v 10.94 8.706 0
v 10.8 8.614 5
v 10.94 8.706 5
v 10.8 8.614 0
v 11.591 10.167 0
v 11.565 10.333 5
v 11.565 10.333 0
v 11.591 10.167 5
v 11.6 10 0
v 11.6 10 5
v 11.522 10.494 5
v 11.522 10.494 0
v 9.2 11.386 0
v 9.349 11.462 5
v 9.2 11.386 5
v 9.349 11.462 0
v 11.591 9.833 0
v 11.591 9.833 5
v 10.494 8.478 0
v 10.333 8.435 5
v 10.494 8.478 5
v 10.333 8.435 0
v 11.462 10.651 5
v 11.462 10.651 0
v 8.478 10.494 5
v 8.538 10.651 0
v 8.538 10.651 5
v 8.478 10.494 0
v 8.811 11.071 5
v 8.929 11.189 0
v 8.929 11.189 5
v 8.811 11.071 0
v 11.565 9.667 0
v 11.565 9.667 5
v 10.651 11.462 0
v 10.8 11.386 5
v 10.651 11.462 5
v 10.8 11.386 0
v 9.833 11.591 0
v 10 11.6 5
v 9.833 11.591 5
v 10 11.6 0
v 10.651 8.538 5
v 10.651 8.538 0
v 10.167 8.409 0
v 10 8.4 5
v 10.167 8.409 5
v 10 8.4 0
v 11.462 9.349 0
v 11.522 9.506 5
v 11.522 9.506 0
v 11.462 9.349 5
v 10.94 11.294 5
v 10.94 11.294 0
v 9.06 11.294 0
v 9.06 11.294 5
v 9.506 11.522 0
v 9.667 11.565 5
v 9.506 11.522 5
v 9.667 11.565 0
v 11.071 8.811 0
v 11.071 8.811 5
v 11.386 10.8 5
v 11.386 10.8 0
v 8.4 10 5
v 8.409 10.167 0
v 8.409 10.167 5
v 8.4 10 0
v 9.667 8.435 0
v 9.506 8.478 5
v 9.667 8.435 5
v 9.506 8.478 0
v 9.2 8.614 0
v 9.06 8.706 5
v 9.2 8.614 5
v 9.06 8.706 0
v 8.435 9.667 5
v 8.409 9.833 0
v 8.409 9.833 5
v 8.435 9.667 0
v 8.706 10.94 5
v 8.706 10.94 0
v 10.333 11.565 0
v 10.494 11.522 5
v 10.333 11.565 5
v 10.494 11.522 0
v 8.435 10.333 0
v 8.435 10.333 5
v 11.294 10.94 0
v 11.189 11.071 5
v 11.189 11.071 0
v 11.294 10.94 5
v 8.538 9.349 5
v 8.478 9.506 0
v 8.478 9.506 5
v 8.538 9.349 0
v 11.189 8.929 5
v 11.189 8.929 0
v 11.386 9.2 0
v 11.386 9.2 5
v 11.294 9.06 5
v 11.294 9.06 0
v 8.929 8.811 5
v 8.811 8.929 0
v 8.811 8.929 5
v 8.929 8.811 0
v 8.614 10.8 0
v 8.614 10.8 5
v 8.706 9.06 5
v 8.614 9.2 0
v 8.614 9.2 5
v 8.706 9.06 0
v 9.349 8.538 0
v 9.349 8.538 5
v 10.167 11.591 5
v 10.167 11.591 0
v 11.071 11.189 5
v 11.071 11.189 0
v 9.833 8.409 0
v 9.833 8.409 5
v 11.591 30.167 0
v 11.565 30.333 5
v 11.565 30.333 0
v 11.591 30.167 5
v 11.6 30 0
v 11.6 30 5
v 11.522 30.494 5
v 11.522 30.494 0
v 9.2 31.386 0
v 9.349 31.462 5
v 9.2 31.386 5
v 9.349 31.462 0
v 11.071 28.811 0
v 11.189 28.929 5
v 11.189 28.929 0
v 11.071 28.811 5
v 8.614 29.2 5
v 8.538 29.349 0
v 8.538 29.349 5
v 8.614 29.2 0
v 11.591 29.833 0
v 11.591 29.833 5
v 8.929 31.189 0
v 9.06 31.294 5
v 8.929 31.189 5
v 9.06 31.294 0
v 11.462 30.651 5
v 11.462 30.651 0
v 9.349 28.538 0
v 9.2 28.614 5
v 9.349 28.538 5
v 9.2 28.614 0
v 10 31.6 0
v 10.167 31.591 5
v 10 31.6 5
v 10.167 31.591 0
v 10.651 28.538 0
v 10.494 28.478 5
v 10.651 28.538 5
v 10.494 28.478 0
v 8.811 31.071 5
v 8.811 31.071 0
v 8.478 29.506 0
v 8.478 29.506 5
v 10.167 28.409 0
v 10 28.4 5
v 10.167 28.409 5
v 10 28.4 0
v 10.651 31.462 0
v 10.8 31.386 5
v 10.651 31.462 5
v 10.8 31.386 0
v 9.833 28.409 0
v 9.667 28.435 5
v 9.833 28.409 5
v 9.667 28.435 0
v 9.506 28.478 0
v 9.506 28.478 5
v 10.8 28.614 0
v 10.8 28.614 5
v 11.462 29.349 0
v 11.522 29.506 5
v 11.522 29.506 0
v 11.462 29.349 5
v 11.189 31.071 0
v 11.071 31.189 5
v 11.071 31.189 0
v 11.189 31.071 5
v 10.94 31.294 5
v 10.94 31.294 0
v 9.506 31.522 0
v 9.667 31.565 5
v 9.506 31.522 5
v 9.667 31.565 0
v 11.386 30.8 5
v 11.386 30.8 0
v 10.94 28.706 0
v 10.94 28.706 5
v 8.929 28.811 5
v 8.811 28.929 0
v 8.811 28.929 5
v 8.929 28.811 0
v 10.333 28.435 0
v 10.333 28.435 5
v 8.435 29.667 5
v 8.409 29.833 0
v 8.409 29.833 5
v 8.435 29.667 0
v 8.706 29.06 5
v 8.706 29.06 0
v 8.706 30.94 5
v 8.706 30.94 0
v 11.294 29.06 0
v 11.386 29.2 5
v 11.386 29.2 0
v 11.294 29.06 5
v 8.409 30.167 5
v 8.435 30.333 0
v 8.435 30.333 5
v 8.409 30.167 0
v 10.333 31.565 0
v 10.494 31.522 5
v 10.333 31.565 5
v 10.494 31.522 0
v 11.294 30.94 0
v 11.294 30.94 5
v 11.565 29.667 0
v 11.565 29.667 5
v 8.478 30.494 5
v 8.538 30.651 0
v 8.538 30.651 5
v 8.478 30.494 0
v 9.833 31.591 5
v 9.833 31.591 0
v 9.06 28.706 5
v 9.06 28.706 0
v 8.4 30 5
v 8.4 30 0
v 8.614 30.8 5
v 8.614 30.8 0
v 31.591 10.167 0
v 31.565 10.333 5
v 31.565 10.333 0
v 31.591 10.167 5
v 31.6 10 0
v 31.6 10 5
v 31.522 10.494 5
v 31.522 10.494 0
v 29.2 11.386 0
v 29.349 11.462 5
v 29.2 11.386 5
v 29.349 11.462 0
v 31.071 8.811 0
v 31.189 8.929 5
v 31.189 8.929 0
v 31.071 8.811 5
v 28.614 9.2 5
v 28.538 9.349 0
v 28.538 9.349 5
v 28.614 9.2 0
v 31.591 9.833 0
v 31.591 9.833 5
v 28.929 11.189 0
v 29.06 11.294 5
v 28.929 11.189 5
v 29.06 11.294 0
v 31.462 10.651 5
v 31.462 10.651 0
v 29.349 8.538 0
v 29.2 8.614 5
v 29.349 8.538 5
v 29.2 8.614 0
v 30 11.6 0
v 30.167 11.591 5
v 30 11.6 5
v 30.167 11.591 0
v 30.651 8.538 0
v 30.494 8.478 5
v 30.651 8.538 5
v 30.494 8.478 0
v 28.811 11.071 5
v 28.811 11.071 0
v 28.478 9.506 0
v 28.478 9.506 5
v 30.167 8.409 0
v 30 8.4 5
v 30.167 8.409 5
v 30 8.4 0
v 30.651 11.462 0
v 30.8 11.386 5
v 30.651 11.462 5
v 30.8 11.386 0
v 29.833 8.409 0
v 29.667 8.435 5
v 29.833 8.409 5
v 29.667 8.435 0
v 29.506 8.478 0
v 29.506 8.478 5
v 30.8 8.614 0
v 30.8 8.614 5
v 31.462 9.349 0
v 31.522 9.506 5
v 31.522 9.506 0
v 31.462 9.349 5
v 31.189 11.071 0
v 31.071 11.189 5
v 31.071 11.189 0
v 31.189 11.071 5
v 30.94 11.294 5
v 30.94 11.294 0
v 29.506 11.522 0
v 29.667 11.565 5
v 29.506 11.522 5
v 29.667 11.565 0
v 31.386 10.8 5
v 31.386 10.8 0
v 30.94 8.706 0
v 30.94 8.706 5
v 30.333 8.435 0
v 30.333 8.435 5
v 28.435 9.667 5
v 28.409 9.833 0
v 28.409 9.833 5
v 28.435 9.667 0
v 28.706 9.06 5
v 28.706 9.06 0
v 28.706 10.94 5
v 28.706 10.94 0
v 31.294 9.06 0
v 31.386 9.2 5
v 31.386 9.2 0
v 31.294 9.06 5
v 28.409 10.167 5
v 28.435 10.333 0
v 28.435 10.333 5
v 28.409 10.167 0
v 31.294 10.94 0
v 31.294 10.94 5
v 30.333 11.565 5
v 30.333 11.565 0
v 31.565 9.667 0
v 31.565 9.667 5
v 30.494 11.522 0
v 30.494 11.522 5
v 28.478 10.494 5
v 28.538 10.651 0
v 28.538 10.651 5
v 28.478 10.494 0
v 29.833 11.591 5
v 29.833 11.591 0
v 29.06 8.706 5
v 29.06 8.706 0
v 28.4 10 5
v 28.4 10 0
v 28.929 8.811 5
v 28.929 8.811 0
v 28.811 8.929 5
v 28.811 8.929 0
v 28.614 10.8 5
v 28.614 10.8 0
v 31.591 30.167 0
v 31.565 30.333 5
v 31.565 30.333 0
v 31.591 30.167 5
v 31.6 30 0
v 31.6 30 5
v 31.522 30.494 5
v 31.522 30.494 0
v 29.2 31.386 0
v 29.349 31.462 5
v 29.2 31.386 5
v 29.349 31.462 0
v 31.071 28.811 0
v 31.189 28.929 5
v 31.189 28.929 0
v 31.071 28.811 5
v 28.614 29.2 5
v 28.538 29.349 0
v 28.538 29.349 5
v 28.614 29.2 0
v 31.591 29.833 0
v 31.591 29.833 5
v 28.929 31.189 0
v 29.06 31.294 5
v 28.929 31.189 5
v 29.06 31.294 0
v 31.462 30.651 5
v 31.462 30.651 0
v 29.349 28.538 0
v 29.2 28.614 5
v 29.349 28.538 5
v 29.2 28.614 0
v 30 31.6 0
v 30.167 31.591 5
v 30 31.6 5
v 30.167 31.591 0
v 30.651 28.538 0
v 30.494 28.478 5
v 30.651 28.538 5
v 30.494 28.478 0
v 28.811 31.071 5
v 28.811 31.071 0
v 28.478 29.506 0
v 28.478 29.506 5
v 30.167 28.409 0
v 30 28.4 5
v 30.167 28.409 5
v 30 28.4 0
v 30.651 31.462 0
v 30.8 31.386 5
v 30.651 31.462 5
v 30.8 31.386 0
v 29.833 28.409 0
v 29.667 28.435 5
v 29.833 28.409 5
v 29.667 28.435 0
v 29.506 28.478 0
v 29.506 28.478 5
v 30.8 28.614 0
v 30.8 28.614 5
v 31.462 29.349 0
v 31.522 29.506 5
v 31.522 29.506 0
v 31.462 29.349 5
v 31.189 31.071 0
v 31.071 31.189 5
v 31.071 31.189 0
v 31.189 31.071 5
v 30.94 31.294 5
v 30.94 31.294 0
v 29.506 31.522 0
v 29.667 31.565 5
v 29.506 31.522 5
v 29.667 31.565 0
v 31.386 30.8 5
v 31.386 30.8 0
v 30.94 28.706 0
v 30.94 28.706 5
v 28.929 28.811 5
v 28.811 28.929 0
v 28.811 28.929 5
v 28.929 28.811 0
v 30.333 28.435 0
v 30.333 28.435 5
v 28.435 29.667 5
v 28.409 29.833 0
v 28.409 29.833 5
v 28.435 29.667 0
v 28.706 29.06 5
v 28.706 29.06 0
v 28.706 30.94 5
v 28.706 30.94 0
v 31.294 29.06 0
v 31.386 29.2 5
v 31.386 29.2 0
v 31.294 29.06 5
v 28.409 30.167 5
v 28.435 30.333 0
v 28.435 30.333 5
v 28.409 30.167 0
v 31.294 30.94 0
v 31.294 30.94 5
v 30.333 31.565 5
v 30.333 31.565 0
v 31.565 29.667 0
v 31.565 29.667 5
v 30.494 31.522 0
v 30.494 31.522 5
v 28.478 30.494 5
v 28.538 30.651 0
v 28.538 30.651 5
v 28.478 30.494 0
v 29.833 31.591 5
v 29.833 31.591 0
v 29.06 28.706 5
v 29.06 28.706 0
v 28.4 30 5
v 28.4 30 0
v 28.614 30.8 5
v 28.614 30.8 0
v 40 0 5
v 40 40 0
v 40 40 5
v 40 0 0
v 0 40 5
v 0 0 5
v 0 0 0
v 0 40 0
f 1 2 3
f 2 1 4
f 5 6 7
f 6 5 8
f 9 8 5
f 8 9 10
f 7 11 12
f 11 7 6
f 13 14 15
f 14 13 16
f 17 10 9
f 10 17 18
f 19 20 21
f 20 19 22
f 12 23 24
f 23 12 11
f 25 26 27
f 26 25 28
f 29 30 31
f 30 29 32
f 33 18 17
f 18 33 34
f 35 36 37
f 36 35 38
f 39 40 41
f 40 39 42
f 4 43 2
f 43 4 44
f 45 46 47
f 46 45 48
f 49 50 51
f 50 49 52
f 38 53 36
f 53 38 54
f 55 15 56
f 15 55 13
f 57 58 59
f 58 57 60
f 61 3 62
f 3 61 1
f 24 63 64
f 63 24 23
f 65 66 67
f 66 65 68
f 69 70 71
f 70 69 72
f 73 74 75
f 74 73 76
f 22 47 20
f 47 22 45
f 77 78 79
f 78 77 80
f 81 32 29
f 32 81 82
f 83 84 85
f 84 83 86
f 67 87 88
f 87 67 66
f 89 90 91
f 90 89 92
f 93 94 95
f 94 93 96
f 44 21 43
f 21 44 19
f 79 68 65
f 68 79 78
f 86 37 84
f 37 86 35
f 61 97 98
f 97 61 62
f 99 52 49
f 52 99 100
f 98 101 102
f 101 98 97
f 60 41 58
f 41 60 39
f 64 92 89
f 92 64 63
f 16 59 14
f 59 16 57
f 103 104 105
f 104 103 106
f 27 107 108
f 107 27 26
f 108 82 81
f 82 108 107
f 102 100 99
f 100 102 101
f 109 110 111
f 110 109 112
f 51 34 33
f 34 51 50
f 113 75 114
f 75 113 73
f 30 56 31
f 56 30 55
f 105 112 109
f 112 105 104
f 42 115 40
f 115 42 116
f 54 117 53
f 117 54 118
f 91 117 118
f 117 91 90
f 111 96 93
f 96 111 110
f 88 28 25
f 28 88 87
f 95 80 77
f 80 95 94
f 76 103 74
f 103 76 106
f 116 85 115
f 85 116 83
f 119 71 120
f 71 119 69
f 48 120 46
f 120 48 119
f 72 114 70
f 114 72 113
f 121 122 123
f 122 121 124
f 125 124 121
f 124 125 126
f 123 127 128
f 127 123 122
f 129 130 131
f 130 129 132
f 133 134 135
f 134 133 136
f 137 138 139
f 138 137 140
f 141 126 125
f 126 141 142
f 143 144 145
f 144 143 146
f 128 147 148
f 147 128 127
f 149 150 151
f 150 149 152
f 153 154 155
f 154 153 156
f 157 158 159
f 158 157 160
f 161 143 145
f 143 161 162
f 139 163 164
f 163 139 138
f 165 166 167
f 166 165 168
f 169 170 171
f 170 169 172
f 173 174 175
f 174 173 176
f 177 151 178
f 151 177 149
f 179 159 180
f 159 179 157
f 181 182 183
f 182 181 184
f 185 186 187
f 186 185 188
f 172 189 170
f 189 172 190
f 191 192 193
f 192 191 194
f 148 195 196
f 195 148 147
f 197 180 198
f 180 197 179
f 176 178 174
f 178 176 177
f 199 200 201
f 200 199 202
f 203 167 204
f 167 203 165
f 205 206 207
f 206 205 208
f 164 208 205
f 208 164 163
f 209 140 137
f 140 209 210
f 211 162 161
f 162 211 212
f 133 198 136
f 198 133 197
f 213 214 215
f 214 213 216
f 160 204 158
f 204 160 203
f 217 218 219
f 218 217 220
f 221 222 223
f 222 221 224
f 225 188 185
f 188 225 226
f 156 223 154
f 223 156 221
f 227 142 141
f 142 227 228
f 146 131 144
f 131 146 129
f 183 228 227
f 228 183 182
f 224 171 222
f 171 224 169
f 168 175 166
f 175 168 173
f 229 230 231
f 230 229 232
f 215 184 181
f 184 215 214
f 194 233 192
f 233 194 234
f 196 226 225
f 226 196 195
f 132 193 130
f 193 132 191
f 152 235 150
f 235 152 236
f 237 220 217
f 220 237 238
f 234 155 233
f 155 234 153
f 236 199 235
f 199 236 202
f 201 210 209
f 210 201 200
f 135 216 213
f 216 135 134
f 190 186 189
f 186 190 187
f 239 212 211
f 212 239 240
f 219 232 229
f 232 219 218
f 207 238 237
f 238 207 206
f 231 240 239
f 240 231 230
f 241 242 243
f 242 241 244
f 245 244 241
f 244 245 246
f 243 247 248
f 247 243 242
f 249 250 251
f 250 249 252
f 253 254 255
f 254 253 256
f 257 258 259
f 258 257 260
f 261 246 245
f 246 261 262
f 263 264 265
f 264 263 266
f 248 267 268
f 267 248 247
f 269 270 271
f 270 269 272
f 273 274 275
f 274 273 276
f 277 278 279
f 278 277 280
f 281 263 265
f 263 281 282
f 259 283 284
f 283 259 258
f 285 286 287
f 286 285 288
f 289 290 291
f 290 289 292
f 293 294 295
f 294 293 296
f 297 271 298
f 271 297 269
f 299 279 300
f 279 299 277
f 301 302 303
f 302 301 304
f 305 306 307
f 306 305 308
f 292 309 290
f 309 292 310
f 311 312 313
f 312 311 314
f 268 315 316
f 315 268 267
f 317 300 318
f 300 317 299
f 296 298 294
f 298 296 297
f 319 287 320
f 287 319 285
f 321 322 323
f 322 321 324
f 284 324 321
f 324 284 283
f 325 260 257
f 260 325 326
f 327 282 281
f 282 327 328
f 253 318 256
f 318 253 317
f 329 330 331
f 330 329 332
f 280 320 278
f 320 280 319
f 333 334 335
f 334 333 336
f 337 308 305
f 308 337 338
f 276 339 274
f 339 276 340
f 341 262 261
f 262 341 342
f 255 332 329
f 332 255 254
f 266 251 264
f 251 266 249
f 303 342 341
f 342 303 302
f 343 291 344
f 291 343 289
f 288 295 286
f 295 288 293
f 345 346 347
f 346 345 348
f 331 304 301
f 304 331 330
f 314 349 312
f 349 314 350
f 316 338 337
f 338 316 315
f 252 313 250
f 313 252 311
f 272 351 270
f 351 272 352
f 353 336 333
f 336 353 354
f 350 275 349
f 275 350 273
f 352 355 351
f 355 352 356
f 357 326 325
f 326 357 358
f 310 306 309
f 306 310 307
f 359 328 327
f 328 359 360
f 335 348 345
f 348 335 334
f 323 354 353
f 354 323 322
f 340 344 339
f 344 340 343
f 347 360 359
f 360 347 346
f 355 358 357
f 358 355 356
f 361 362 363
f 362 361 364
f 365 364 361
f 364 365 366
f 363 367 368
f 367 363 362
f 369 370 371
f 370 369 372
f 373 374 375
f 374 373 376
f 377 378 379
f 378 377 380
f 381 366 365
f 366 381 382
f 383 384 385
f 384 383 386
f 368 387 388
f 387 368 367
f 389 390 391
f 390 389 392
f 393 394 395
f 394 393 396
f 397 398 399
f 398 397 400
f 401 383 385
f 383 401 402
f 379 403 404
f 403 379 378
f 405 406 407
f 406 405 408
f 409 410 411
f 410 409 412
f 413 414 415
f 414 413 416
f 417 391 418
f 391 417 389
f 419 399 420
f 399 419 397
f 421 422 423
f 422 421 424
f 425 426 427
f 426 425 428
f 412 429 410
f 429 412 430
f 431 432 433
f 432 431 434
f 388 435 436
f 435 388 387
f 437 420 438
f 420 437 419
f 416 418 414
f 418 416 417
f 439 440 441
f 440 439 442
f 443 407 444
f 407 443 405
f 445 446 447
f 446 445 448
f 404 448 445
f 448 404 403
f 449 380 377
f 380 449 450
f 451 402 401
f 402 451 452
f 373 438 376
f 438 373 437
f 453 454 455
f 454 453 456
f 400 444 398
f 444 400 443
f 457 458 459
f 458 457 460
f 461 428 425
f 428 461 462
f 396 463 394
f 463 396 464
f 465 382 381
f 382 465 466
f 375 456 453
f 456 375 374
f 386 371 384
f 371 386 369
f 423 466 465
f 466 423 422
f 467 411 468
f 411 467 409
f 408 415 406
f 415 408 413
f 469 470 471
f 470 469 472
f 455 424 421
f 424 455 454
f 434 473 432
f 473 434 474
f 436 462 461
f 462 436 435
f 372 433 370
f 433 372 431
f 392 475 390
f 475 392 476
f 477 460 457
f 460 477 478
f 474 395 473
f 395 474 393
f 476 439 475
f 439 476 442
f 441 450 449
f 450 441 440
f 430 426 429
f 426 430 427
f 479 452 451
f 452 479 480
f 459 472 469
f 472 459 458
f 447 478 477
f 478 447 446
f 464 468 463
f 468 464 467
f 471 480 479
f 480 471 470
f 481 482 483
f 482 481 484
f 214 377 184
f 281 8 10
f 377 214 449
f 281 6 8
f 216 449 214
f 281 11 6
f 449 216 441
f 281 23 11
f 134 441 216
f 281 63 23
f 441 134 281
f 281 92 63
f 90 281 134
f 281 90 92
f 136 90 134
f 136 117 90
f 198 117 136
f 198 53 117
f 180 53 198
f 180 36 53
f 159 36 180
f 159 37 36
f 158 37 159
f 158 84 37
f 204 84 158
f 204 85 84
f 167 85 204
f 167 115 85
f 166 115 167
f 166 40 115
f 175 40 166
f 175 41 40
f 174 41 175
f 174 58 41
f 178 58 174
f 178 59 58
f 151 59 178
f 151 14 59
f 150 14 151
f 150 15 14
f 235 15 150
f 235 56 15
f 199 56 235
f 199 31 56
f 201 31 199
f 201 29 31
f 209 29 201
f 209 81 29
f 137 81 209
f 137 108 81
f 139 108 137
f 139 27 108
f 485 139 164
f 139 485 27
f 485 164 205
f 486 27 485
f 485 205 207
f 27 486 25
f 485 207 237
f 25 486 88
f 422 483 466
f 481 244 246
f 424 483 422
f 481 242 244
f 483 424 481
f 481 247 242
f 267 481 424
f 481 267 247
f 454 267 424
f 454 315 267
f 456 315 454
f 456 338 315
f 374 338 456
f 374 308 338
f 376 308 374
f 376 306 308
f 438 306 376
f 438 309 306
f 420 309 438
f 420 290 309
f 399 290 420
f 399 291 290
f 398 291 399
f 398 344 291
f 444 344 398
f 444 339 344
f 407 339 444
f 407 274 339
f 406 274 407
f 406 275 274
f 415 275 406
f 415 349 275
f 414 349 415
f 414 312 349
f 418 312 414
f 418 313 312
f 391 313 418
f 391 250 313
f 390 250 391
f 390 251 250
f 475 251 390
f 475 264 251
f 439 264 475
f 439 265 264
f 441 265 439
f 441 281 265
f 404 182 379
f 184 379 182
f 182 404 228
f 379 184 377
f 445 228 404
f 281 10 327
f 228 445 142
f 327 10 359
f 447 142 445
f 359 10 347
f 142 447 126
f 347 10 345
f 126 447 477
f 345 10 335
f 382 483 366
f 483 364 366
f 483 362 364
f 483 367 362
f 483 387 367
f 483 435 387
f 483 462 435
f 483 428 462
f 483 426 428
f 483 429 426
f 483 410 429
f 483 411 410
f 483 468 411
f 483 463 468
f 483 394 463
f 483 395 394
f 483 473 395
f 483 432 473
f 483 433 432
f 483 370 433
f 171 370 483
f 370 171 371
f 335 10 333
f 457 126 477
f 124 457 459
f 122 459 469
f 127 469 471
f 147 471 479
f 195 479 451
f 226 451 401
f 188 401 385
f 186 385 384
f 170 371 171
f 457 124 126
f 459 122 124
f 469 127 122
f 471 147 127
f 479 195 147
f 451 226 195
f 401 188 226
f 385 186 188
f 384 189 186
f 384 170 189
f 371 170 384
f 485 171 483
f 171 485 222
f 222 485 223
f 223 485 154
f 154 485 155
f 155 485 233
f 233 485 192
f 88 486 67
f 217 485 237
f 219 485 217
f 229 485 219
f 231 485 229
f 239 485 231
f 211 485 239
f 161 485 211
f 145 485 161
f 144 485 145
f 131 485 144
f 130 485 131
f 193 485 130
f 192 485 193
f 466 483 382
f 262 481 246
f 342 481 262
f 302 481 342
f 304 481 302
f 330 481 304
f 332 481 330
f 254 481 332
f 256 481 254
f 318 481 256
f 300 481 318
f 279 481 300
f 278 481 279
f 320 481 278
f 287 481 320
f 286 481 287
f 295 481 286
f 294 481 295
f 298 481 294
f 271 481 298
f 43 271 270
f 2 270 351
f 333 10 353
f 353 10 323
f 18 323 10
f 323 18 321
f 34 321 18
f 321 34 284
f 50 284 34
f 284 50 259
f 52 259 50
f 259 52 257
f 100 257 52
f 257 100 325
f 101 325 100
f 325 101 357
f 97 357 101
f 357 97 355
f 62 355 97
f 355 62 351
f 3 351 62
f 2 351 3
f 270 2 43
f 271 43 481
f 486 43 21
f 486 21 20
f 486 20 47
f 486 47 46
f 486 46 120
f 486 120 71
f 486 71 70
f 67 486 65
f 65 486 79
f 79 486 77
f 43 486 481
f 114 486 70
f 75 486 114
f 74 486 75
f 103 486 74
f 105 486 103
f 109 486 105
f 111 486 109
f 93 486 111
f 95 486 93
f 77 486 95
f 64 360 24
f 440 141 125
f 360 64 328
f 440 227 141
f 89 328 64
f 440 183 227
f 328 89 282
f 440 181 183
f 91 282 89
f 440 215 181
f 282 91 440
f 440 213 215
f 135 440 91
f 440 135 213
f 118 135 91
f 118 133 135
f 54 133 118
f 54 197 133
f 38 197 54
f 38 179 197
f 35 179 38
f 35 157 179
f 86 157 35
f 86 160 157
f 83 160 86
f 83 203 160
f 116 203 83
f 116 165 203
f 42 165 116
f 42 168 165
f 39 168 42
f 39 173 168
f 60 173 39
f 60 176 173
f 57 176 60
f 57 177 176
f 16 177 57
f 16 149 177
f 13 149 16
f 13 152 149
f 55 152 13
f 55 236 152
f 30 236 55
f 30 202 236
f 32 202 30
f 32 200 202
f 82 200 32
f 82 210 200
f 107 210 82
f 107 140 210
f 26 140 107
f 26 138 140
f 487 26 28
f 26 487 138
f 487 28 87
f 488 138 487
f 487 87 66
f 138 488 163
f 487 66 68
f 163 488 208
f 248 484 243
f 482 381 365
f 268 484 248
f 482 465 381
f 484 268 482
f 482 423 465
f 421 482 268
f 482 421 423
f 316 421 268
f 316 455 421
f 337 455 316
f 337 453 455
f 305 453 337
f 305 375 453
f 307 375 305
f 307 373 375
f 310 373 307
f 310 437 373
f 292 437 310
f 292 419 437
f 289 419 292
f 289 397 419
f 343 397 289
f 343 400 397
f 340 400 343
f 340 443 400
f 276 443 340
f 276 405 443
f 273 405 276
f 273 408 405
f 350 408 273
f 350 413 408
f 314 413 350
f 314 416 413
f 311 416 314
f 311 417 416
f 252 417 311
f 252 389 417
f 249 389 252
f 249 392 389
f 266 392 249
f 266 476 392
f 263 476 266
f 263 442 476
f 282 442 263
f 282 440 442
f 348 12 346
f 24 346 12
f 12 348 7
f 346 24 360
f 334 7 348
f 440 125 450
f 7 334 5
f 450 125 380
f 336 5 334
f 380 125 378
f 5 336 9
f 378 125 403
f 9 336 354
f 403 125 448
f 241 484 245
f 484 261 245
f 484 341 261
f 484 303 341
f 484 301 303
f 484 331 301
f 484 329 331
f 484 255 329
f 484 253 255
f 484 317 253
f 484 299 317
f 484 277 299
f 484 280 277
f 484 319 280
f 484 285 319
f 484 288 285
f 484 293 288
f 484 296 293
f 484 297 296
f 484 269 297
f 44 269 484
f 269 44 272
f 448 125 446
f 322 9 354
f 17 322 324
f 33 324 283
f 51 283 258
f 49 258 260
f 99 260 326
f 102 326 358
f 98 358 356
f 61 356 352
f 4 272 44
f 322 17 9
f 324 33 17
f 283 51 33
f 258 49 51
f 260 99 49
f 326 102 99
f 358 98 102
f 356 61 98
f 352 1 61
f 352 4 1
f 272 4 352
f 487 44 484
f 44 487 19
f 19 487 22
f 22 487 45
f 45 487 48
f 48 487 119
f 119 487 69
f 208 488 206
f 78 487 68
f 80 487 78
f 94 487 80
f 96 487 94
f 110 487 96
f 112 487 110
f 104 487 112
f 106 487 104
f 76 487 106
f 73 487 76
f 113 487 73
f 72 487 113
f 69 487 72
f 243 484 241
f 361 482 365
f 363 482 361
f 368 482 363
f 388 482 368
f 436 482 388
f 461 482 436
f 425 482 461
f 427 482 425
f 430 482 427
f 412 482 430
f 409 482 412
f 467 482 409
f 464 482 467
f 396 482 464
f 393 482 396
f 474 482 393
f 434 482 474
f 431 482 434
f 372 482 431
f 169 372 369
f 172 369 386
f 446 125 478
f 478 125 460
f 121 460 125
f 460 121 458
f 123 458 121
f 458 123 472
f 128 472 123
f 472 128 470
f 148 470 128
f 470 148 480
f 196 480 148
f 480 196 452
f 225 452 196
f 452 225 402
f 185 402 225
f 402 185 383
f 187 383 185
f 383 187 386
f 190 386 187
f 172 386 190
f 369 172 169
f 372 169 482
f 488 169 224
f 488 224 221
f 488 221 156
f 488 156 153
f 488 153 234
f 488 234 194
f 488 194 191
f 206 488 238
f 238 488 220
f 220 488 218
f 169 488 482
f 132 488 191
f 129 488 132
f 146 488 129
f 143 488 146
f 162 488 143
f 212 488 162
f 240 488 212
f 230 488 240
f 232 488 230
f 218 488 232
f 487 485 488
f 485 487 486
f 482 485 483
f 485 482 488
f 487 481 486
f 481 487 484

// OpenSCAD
difference() {
	cube([40, 40, 5]);
	for(i=[10,30]) {
		for(j=[10, 30]) {
			translate([i, j, -0.1]) cylinder(r=1.5+0.1, h=5.2, $fn=60);
			// translate([i, j, 3]) cylinder(r=3, h=5.2, $fn=60);
		}
	}
}
